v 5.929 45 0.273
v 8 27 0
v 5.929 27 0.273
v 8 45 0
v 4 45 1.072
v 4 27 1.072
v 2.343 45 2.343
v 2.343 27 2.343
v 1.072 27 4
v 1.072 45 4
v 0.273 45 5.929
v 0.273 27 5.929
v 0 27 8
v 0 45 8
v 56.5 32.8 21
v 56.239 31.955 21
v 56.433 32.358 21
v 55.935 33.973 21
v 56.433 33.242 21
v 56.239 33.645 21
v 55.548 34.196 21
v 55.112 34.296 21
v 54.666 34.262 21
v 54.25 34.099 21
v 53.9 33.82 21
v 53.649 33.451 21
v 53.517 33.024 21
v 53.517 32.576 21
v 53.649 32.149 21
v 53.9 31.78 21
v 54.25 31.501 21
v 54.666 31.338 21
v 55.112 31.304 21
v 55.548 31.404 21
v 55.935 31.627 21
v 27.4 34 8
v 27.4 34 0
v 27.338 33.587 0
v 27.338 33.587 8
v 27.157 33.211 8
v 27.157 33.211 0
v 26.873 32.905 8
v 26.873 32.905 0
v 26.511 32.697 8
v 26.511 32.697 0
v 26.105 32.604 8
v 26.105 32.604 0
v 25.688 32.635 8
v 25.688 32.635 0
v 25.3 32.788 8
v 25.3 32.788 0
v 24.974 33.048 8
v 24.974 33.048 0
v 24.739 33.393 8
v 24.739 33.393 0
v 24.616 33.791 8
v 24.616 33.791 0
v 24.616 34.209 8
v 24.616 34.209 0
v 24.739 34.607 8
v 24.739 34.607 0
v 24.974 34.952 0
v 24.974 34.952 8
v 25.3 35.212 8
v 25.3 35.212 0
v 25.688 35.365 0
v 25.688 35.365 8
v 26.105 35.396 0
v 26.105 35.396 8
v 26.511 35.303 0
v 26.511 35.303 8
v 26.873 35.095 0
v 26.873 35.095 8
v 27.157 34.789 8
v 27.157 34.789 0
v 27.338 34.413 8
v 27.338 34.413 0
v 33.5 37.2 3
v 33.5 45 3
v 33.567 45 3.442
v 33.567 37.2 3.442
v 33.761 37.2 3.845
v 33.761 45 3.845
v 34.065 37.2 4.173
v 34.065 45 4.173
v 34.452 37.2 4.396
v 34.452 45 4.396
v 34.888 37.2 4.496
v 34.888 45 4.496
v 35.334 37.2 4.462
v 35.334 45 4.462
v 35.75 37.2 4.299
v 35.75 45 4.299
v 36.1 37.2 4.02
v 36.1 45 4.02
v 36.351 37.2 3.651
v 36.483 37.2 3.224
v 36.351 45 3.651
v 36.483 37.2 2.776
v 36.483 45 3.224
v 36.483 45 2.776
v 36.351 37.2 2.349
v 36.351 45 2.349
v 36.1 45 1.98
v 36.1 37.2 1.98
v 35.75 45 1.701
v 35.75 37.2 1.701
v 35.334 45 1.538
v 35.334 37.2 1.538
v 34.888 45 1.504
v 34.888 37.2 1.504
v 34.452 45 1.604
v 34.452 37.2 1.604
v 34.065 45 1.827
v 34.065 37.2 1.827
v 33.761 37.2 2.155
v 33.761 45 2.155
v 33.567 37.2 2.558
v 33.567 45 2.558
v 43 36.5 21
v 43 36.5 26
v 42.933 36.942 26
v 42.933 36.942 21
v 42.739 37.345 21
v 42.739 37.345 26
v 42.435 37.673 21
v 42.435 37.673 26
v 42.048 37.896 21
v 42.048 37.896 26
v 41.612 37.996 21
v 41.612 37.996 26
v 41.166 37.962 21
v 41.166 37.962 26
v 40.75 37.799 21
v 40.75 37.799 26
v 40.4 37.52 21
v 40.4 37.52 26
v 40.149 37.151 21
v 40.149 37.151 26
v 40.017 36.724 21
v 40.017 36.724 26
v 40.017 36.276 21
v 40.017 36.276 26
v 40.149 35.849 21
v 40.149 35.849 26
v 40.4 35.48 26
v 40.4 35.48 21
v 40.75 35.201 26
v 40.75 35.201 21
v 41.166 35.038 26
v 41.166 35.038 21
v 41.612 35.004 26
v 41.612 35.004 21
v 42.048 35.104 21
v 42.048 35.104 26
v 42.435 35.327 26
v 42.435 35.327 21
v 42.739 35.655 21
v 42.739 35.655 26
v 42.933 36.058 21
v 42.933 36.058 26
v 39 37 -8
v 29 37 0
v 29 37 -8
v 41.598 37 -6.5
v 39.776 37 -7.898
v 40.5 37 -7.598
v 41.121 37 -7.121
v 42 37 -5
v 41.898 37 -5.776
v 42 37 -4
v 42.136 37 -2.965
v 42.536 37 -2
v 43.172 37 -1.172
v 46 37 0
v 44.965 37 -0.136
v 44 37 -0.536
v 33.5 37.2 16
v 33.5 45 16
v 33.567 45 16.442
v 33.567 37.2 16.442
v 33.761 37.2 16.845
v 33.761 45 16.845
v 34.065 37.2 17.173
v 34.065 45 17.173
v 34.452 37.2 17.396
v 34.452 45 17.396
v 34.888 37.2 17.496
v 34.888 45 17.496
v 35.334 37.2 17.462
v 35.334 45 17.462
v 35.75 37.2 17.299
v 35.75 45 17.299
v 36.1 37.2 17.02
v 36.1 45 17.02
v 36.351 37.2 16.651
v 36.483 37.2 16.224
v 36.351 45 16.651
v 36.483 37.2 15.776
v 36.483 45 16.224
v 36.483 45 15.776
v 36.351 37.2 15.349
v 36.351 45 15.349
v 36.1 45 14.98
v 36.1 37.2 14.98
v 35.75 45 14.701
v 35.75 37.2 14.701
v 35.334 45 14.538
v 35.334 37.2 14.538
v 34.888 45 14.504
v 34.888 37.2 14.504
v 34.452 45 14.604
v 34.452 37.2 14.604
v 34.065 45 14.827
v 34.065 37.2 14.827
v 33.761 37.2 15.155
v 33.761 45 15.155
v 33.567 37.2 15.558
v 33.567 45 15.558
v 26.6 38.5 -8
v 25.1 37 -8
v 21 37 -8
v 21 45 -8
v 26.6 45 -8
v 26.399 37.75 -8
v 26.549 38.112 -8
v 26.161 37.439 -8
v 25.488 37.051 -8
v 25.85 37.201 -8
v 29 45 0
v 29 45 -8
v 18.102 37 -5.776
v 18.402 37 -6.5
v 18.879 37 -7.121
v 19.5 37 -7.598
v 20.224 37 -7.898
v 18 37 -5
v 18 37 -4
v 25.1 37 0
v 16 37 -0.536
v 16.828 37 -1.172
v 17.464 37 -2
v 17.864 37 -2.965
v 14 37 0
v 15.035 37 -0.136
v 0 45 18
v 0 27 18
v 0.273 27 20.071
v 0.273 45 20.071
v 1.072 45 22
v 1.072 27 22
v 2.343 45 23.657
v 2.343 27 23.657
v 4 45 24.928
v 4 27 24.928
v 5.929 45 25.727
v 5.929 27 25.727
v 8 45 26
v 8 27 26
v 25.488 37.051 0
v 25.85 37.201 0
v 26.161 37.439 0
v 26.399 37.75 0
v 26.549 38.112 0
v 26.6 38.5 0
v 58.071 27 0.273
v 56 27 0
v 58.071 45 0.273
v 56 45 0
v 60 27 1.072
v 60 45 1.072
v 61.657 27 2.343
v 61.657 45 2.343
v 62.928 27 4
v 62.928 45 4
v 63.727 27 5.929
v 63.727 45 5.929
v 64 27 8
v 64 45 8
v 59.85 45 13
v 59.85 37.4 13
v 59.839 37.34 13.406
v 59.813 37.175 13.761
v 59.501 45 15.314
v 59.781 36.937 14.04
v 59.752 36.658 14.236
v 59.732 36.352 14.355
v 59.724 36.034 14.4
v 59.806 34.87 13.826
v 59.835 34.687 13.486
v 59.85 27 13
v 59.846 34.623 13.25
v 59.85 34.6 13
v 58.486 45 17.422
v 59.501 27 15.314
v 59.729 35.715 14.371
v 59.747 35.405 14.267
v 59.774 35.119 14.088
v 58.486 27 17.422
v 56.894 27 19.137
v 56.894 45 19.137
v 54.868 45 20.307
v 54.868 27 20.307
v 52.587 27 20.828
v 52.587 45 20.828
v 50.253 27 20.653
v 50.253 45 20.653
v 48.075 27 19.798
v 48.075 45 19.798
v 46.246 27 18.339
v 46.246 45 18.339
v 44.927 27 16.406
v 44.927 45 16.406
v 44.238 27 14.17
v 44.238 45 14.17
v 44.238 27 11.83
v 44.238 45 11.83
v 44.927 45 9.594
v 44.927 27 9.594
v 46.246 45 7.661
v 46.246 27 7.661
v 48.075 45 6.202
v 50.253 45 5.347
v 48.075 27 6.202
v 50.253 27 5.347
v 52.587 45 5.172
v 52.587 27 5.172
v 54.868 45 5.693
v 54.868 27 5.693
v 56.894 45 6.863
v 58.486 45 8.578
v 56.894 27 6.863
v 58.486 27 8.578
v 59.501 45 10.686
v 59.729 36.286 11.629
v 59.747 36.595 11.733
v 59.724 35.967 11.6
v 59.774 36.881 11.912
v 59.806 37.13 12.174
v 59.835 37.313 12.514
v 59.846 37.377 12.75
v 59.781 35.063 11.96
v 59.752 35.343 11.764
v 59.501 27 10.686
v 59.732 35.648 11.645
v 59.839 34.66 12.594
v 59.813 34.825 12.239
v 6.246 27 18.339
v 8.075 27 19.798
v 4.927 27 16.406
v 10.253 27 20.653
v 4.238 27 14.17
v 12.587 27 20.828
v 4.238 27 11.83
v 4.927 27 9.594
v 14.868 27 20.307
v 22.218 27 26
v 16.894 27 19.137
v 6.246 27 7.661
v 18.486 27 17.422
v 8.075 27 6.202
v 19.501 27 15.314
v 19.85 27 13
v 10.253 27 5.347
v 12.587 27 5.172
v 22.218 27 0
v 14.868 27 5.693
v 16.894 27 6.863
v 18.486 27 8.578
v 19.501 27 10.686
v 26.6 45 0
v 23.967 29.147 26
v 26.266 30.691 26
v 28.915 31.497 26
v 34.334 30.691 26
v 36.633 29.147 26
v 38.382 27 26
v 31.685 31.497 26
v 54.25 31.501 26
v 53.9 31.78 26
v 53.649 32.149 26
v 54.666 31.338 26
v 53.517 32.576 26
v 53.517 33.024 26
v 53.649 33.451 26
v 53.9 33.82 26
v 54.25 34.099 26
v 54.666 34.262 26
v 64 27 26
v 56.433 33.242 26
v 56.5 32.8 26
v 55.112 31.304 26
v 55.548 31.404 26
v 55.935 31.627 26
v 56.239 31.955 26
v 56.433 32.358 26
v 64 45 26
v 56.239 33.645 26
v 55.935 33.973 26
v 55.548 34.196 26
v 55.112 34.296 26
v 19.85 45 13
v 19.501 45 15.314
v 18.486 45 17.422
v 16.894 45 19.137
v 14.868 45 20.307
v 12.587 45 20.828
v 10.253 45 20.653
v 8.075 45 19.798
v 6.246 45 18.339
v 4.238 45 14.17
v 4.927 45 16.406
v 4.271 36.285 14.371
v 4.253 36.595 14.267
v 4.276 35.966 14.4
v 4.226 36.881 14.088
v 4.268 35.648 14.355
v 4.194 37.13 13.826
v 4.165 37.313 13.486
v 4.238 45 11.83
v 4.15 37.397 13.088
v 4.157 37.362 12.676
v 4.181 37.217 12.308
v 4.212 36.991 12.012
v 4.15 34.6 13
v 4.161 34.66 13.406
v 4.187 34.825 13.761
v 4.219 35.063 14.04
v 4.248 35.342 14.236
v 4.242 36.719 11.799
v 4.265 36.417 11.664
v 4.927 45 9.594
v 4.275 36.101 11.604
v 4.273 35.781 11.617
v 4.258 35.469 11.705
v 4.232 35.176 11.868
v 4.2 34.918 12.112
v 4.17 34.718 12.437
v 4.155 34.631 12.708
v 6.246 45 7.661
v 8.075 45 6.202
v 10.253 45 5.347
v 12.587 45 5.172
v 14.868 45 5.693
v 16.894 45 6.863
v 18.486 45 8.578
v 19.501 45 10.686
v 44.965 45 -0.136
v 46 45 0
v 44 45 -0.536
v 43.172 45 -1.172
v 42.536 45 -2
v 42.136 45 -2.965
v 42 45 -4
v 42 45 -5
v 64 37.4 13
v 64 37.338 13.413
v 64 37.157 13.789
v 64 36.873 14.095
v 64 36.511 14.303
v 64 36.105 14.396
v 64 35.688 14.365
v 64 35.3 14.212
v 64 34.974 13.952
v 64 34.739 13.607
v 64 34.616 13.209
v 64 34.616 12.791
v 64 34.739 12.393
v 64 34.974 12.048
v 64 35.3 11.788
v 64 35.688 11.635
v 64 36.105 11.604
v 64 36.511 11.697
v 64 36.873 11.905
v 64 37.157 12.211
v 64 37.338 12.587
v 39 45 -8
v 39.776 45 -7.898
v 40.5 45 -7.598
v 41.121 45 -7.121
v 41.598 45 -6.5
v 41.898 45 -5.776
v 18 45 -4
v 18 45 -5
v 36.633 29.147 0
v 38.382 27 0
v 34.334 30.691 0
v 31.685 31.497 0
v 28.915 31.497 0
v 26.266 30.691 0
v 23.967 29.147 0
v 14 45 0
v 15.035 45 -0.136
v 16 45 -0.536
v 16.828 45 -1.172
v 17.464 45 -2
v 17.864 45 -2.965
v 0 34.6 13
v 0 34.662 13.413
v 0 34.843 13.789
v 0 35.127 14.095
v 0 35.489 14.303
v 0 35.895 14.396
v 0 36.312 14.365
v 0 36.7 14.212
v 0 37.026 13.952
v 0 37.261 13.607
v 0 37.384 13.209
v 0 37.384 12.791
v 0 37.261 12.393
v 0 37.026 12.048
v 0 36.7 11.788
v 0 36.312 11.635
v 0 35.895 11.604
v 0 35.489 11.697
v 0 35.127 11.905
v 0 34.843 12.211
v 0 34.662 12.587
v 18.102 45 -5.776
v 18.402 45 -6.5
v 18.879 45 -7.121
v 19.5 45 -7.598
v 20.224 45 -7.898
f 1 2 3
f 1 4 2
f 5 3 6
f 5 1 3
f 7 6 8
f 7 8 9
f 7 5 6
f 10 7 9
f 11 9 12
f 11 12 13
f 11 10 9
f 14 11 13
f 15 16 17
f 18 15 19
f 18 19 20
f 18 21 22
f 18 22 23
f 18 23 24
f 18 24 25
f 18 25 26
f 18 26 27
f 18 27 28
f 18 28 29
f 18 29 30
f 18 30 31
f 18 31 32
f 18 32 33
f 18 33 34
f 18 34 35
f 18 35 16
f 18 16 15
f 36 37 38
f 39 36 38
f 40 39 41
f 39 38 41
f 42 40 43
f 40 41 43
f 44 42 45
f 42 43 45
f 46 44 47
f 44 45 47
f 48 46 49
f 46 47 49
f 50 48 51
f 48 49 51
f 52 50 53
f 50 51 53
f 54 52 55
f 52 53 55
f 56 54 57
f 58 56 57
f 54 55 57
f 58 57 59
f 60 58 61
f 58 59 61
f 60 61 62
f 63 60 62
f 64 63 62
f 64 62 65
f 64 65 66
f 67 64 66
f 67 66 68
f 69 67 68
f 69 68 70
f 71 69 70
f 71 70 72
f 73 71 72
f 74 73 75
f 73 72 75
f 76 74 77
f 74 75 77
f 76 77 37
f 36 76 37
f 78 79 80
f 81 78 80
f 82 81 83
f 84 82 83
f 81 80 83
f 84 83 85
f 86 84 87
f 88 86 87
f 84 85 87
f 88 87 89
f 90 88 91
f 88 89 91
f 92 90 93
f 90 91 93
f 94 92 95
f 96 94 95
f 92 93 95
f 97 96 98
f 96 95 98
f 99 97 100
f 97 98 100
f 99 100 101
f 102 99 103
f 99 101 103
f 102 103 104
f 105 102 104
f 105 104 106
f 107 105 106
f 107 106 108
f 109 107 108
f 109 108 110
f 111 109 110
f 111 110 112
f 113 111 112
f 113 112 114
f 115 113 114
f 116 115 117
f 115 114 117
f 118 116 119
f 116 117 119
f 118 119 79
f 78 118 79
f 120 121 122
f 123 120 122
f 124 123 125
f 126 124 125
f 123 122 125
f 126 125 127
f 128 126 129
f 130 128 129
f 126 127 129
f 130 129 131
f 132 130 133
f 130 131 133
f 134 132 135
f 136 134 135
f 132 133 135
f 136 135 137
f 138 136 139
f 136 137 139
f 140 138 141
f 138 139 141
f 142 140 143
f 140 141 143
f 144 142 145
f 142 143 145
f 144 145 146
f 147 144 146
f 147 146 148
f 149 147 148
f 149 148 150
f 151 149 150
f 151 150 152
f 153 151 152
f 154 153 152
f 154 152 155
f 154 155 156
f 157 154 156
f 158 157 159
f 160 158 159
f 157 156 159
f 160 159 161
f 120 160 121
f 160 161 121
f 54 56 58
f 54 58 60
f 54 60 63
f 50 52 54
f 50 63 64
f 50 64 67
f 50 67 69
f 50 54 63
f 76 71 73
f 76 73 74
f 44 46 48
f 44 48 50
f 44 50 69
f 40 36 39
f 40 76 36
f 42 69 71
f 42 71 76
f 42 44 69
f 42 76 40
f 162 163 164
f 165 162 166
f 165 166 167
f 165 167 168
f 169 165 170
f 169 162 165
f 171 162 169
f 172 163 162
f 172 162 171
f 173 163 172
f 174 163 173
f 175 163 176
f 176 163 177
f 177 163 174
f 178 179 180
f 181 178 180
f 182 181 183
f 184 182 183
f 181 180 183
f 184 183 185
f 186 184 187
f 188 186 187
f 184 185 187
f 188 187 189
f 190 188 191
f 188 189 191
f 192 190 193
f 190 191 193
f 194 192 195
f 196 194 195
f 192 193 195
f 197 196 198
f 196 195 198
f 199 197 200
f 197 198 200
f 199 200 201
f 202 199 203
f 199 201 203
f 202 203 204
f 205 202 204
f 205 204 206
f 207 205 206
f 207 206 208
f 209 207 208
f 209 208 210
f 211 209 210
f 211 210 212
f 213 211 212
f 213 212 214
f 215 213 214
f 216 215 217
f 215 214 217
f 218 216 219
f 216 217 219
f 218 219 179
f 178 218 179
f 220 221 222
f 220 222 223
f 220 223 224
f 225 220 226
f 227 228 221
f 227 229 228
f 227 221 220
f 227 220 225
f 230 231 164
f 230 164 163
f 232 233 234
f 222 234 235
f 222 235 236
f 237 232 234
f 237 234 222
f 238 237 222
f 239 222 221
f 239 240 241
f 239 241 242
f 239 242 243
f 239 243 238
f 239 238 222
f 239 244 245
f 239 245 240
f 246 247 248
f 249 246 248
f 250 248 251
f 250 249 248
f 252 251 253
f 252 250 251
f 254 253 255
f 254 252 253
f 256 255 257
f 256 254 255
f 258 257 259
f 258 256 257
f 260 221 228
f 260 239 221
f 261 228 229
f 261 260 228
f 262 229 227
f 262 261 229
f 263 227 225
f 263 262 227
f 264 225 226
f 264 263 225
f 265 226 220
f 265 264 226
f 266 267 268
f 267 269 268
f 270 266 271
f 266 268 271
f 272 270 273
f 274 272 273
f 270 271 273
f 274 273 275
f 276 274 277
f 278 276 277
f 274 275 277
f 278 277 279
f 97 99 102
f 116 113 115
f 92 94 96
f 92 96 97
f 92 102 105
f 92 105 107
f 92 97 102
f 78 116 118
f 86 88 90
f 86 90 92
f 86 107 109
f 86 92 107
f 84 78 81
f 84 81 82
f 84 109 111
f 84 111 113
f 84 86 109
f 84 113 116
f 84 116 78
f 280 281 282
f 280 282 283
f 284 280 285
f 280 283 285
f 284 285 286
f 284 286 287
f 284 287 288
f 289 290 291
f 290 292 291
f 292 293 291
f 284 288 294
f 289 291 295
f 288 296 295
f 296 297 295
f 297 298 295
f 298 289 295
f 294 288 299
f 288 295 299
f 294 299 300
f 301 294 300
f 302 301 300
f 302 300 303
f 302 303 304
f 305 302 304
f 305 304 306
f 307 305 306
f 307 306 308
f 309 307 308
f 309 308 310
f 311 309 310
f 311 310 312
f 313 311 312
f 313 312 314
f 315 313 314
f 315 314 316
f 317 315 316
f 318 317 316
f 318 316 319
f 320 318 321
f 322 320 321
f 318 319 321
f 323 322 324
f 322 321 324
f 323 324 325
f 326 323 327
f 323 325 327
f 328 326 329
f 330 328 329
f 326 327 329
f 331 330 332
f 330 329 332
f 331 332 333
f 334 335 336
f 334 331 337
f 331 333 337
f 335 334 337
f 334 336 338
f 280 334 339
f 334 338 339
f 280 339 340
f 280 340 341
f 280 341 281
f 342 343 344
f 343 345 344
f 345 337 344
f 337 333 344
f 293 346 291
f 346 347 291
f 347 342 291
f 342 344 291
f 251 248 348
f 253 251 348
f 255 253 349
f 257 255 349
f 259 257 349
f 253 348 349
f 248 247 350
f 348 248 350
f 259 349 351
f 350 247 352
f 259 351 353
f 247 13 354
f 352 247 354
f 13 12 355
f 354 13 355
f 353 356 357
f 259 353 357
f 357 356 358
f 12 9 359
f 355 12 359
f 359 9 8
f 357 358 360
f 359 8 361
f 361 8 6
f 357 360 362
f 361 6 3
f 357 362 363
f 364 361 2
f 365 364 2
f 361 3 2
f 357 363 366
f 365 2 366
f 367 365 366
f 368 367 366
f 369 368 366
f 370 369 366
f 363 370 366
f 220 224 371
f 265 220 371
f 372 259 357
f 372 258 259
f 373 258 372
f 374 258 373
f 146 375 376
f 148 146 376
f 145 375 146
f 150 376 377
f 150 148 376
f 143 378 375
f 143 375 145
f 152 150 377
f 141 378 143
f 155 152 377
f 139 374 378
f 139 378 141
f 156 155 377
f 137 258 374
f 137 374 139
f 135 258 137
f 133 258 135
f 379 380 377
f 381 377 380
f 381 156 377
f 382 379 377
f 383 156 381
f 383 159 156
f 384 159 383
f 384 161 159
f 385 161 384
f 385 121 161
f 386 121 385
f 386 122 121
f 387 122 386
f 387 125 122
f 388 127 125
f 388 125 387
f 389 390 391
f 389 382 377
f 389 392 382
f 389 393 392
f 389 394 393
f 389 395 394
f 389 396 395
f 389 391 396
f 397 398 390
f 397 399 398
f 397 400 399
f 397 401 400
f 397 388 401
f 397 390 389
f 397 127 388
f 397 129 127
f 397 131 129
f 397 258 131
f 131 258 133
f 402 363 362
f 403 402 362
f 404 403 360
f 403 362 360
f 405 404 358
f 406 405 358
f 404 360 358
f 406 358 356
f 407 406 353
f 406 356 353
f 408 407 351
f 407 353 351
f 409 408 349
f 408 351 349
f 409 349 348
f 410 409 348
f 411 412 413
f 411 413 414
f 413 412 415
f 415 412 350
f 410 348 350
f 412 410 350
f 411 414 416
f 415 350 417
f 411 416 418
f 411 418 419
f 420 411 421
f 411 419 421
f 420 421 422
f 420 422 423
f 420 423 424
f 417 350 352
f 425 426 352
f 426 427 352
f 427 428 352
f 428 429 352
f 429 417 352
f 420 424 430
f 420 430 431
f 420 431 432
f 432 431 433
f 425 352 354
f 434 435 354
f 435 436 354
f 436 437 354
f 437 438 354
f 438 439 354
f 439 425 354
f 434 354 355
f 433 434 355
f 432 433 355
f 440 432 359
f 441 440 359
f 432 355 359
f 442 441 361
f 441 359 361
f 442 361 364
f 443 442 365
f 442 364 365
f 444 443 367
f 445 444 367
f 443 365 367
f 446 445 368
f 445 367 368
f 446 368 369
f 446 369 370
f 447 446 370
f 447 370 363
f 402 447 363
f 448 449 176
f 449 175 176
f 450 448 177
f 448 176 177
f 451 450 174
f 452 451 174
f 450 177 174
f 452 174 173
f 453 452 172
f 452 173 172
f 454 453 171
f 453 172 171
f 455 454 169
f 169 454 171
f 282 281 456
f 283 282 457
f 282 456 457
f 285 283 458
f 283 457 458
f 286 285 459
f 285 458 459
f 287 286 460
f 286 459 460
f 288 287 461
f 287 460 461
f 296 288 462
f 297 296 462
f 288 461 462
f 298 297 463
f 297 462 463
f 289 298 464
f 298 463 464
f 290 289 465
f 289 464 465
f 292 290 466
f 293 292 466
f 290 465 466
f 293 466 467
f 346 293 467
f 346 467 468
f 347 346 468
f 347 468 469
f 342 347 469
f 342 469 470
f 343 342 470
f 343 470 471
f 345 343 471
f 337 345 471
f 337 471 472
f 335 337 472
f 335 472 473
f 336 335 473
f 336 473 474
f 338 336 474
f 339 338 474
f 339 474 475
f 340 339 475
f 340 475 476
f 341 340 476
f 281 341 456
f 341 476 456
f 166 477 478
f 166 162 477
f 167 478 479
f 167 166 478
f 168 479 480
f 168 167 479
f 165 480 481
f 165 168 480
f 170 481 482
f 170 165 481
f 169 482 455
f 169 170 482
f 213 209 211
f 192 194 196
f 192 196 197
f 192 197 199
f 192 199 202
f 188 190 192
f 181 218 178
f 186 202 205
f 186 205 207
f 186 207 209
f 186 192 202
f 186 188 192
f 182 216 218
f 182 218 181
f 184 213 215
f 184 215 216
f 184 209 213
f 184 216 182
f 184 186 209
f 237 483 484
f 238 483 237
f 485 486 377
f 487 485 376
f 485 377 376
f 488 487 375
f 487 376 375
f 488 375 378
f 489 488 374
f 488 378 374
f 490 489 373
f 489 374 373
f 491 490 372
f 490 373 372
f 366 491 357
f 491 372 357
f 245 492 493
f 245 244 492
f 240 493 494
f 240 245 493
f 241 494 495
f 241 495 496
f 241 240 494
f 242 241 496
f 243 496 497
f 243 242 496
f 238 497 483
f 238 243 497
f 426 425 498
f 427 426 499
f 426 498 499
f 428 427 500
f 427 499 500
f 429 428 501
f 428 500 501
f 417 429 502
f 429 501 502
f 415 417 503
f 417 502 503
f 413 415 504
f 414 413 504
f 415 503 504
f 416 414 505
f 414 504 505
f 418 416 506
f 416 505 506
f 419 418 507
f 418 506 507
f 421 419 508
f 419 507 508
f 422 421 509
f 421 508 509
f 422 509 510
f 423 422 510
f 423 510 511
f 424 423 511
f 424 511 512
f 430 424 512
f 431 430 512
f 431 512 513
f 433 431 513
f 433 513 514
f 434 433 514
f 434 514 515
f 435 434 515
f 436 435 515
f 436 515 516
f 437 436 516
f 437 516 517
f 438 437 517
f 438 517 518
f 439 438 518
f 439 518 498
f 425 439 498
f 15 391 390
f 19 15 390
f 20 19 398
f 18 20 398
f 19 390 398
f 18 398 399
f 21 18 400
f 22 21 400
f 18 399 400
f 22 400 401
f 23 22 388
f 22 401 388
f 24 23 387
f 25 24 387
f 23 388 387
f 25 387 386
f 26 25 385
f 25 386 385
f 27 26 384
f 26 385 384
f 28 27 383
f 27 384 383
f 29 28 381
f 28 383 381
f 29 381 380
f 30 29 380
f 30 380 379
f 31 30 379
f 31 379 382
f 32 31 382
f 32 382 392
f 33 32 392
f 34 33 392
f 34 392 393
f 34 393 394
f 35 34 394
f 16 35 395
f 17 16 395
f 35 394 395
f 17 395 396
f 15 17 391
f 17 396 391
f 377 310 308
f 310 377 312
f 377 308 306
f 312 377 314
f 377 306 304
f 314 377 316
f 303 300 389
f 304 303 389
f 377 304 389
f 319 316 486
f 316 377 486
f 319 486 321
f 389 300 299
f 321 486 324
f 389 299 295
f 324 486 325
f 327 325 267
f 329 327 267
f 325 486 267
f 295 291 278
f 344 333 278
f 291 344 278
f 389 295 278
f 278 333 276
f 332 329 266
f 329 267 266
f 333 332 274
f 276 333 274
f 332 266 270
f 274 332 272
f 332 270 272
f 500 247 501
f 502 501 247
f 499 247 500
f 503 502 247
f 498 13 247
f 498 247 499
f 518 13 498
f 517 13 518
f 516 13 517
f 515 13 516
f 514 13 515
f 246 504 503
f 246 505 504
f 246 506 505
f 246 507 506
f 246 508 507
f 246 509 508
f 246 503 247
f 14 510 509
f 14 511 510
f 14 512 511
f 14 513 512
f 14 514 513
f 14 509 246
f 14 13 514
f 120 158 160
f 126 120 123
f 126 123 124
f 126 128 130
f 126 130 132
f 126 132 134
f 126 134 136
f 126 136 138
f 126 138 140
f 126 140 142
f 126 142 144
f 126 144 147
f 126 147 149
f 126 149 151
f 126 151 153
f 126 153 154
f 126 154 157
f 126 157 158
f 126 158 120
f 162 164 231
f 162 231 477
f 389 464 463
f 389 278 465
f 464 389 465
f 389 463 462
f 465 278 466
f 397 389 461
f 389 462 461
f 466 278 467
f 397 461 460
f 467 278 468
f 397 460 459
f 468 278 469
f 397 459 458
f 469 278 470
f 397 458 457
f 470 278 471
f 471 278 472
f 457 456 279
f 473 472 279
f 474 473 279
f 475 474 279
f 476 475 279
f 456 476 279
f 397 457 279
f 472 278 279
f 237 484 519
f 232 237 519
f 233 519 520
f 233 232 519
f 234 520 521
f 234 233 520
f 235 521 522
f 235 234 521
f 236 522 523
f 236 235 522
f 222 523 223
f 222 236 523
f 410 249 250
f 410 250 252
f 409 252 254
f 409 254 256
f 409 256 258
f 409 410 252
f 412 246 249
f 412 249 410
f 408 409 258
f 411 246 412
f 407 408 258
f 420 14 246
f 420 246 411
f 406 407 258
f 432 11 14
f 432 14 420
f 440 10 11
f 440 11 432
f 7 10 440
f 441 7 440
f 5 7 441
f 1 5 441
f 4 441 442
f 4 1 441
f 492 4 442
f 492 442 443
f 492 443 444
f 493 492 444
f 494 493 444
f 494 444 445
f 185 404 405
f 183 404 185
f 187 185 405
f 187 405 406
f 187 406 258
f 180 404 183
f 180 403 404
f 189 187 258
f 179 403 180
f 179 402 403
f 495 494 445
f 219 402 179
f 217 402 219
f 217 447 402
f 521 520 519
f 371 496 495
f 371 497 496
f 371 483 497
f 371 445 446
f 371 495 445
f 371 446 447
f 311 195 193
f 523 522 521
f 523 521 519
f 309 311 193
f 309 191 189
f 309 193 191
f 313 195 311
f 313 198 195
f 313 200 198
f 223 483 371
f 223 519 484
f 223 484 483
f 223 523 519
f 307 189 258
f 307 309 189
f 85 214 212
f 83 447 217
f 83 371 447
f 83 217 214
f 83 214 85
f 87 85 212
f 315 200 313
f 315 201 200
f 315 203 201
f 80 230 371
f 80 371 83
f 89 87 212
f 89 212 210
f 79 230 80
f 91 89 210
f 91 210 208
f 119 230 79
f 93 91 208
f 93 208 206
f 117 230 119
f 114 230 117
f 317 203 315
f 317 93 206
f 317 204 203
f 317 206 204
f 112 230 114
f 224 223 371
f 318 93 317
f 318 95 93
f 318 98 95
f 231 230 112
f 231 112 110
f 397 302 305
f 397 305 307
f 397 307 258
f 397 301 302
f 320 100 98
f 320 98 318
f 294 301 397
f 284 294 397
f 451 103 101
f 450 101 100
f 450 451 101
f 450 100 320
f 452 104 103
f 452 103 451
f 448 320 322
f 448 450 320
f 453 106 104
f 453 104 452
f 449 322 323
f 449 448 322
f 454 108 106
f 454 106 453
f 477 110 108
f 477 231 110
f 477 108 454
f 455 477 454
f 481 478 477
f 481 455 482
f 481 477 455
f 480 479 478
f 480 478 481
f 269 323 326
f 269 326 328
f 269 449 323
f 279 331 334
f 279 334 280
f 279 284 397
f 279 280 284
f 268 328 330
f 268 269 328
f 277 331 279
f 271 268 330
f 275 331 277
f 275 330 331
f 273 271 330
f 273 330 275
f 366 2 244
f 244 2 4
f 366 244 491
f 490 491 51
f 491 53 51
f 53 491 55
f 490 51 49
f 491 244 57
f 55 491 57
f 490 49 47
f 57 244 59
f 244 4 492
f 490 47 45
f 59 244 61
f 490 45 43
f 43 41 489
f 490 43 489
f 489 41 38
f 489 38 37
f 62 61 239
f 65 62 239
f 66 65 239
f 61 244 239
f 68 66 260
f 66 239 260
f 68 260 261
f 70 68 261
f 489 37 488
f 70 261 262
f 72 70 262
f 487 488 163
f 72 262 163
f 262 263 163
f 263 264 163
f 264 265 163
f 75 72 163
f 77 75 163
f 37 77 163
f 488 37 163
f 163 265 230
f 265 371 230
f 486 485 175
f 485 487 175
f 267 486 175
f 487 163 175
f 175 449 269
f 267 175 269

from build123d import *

# Parameters (mm, degrees)
BOX001_W        = 64
BOX001_H        = 18
BOX001_DEPTH    = 26
SKETCH010_R     = 7.85
POCKET001_DEPTH = 18.001
SKETCH011_W     = 24
SKETCH011_H     = 8
PAD001_DEPTH    = 8
SKETCH017_R     = 9.4
POCKET003_DEPTH = 34.001
SKETCH019_R     = 1.5
POCKET005_DEPTH = 5
SKETCH022_R     = 1.4
POCKET008_DEPTH = 5
SKETCH023_R     = 1.4
POCKET009_DEPTH = 5
SKETCH025_R     = 1.4
POCKET010_DEPTH = 8
SKETCH028_R     = 1.5
POCKET013_DEPTH = 7.8
SKETCH024_W     = 2.4
SKETCH024_H     = 8.929814
POCKET014_DEPTH = 8
FILLET_R        = 4
FILLET001_R     = 3
FILLET002_R     = 1.5
FILLET003_R     = 8


with BuildPart() as part:
    # Box001 → Box001 (new body)
    with BuildSketch(Plane(origin=(0, 27, 0), x_dir=(1, 0, 0), z_dir=(0, 0, 1))):
        with Locations((32, 9)):
            Rectangle(BOX001_W, BOX001_H)
    extrude(amount=BOX001_DEPTH)

    # Sketch010 → Pocket001 (cut, through all)
    with BuildSketch(Plane.XZ.offset(-27)):
        with Locations((12, 13)):
            Circle(SKETCH010_R)
        with Locations((52, 13)):
            Circle(SKETCH010_R)
    extrude(amount=-POCKET001_DEPTH, mode=Mode.SUBTRACT)

    # Sketch011 → Pad001 (new body)
    with BuildSketch(Plane(origin=(0, 27, 0), x_dir=(1, 0, 0), z_dir=(0, 0, -1))):
        with Locations((30, -14)):
            Rectangle(SKETCH011_W, SKETCH011_H)
    extrude(amount=PAD001_DEPTH)

    # Sketch017 → Pocket003 (cut, through all)
    with BuildSketch(Plane(origin=(0, 27, 26), x_dir=(1, 0, 0), z_dir=(0, 0, 1))):
        with Locations((30.3, -4.8)):
            Circle(SKETCH017_R)
    extrude(amount=-POCKET003_DEPTH, mode=Mode.SUBTRACT)

    # Sketch019 → Pocket005 (cut)
    with BuildSketch(Plane(origin=(0, 27, 26), x_dir=(1, 0, 0), z_dir=(0, 0, 1))):
        with Locations((41.5, 9.5)):
            Circle(SKETCH019_R)
        with Locations((55, 5.8)):
            Circle(SKETCH019_R)
    extrude(amount=-POCKET005_DEPTH, mode=Mode.SUBTRACT)

    # Sketch022 → Pocket008 (cut)
    with BuildSketch(Plane(origin=(0, 27, 0), x_dir=(0, -1, 0), z_dir=(-1, 0, 0))):
        with Locations((-9, 13)):
            Circle(SKETCH022_R)
    extrude(amount=-POCKET008_DEPTH, mode=Mode.SUBTRACT)

    # Sketch023 → Pocket009 (cut)
    with BuildSketch(Plane(origin=(64, 27, 0), x_dir=(0, 1, 0), z_dir=(1, 0, 0))):
        with Locations((9, 13)):
            Circle(SKETCH023_R)
    extrude(amount=-POCKET009_DEPTH, mode=Mode.SUBTRACT)

    # Sketch025 → Pocket010 (cut)
    with BuildSketch(Plane(origin=(0, 27, 0), x_dir=(1, 0, 0), z_dir=(0, 0, -1))):
        with Locations((26, -7)):
            Circle(SKETCH025_R)
    extrude(amount=-POCKET010_DEPTH, mode=Mode.SUBTRACT)

    # Sketch028 → Pocket013 (cut)
    with BuildSketch(Plane(origin=(0, 45, 0), x_dir=(-1, 0, 0), z_dir=(0, 1, 0))):
        with Locations((-35, 3)):
            Circle(SKETCH028_R)
        with Locations((-35, 16)):
            Circle(SKETCH028_R)
    extrude(amount=-POCKET013_DEPTH, mode=Mode.SUBTRACT)

    # Sketch024 → Pocket014 (cut)
    with BuildSketch(Plane(origin=(0, 45, 0), x_dir=(-1, 0, 0), z_dir=(0, 1, 0))):
        with Locations((-27.8, -4.464907)):
            Rectangle(SKETCH024_W, SKETCH024_H)
    extrude(amount=-POCKET014_DEPTH, mode=Mode.SUBTRACT)

    # Fillet
    fillet_edges = [part.edges().sort_by_distance(p)[0] for p in [
        (18, 41, 0),
        (42, 41, 0),
    ]]
    fillet(fillet_edges, radius=FILLET_R)

    # Fillet001
    fillet001_edges = [part.edges().sort_by_distance(p)[0] for p in [
        (42, 41, -8),
        (18, 41, -8),
    ]]
    fillet(fillet001_edges, radius=FILLET001_R)

    # Fillet002
    fillet002_edges = [part.edges().sort_by_distance(p)[0] for p in [
        (26.6, 37, -4),
    ]]
    fillet(fillet002_edges, radius=FILLET002_R)

    # Fillet003
    fillet003_edges = [part.edges().sort_by_distance(p)[0] for p in [
        (64, 36, 0),
        (0, 36, 26),
        (0, 36, 0),
    ]]
    fillet(fillet003_edges, radius=FILLET003_R)


solid = part.part
